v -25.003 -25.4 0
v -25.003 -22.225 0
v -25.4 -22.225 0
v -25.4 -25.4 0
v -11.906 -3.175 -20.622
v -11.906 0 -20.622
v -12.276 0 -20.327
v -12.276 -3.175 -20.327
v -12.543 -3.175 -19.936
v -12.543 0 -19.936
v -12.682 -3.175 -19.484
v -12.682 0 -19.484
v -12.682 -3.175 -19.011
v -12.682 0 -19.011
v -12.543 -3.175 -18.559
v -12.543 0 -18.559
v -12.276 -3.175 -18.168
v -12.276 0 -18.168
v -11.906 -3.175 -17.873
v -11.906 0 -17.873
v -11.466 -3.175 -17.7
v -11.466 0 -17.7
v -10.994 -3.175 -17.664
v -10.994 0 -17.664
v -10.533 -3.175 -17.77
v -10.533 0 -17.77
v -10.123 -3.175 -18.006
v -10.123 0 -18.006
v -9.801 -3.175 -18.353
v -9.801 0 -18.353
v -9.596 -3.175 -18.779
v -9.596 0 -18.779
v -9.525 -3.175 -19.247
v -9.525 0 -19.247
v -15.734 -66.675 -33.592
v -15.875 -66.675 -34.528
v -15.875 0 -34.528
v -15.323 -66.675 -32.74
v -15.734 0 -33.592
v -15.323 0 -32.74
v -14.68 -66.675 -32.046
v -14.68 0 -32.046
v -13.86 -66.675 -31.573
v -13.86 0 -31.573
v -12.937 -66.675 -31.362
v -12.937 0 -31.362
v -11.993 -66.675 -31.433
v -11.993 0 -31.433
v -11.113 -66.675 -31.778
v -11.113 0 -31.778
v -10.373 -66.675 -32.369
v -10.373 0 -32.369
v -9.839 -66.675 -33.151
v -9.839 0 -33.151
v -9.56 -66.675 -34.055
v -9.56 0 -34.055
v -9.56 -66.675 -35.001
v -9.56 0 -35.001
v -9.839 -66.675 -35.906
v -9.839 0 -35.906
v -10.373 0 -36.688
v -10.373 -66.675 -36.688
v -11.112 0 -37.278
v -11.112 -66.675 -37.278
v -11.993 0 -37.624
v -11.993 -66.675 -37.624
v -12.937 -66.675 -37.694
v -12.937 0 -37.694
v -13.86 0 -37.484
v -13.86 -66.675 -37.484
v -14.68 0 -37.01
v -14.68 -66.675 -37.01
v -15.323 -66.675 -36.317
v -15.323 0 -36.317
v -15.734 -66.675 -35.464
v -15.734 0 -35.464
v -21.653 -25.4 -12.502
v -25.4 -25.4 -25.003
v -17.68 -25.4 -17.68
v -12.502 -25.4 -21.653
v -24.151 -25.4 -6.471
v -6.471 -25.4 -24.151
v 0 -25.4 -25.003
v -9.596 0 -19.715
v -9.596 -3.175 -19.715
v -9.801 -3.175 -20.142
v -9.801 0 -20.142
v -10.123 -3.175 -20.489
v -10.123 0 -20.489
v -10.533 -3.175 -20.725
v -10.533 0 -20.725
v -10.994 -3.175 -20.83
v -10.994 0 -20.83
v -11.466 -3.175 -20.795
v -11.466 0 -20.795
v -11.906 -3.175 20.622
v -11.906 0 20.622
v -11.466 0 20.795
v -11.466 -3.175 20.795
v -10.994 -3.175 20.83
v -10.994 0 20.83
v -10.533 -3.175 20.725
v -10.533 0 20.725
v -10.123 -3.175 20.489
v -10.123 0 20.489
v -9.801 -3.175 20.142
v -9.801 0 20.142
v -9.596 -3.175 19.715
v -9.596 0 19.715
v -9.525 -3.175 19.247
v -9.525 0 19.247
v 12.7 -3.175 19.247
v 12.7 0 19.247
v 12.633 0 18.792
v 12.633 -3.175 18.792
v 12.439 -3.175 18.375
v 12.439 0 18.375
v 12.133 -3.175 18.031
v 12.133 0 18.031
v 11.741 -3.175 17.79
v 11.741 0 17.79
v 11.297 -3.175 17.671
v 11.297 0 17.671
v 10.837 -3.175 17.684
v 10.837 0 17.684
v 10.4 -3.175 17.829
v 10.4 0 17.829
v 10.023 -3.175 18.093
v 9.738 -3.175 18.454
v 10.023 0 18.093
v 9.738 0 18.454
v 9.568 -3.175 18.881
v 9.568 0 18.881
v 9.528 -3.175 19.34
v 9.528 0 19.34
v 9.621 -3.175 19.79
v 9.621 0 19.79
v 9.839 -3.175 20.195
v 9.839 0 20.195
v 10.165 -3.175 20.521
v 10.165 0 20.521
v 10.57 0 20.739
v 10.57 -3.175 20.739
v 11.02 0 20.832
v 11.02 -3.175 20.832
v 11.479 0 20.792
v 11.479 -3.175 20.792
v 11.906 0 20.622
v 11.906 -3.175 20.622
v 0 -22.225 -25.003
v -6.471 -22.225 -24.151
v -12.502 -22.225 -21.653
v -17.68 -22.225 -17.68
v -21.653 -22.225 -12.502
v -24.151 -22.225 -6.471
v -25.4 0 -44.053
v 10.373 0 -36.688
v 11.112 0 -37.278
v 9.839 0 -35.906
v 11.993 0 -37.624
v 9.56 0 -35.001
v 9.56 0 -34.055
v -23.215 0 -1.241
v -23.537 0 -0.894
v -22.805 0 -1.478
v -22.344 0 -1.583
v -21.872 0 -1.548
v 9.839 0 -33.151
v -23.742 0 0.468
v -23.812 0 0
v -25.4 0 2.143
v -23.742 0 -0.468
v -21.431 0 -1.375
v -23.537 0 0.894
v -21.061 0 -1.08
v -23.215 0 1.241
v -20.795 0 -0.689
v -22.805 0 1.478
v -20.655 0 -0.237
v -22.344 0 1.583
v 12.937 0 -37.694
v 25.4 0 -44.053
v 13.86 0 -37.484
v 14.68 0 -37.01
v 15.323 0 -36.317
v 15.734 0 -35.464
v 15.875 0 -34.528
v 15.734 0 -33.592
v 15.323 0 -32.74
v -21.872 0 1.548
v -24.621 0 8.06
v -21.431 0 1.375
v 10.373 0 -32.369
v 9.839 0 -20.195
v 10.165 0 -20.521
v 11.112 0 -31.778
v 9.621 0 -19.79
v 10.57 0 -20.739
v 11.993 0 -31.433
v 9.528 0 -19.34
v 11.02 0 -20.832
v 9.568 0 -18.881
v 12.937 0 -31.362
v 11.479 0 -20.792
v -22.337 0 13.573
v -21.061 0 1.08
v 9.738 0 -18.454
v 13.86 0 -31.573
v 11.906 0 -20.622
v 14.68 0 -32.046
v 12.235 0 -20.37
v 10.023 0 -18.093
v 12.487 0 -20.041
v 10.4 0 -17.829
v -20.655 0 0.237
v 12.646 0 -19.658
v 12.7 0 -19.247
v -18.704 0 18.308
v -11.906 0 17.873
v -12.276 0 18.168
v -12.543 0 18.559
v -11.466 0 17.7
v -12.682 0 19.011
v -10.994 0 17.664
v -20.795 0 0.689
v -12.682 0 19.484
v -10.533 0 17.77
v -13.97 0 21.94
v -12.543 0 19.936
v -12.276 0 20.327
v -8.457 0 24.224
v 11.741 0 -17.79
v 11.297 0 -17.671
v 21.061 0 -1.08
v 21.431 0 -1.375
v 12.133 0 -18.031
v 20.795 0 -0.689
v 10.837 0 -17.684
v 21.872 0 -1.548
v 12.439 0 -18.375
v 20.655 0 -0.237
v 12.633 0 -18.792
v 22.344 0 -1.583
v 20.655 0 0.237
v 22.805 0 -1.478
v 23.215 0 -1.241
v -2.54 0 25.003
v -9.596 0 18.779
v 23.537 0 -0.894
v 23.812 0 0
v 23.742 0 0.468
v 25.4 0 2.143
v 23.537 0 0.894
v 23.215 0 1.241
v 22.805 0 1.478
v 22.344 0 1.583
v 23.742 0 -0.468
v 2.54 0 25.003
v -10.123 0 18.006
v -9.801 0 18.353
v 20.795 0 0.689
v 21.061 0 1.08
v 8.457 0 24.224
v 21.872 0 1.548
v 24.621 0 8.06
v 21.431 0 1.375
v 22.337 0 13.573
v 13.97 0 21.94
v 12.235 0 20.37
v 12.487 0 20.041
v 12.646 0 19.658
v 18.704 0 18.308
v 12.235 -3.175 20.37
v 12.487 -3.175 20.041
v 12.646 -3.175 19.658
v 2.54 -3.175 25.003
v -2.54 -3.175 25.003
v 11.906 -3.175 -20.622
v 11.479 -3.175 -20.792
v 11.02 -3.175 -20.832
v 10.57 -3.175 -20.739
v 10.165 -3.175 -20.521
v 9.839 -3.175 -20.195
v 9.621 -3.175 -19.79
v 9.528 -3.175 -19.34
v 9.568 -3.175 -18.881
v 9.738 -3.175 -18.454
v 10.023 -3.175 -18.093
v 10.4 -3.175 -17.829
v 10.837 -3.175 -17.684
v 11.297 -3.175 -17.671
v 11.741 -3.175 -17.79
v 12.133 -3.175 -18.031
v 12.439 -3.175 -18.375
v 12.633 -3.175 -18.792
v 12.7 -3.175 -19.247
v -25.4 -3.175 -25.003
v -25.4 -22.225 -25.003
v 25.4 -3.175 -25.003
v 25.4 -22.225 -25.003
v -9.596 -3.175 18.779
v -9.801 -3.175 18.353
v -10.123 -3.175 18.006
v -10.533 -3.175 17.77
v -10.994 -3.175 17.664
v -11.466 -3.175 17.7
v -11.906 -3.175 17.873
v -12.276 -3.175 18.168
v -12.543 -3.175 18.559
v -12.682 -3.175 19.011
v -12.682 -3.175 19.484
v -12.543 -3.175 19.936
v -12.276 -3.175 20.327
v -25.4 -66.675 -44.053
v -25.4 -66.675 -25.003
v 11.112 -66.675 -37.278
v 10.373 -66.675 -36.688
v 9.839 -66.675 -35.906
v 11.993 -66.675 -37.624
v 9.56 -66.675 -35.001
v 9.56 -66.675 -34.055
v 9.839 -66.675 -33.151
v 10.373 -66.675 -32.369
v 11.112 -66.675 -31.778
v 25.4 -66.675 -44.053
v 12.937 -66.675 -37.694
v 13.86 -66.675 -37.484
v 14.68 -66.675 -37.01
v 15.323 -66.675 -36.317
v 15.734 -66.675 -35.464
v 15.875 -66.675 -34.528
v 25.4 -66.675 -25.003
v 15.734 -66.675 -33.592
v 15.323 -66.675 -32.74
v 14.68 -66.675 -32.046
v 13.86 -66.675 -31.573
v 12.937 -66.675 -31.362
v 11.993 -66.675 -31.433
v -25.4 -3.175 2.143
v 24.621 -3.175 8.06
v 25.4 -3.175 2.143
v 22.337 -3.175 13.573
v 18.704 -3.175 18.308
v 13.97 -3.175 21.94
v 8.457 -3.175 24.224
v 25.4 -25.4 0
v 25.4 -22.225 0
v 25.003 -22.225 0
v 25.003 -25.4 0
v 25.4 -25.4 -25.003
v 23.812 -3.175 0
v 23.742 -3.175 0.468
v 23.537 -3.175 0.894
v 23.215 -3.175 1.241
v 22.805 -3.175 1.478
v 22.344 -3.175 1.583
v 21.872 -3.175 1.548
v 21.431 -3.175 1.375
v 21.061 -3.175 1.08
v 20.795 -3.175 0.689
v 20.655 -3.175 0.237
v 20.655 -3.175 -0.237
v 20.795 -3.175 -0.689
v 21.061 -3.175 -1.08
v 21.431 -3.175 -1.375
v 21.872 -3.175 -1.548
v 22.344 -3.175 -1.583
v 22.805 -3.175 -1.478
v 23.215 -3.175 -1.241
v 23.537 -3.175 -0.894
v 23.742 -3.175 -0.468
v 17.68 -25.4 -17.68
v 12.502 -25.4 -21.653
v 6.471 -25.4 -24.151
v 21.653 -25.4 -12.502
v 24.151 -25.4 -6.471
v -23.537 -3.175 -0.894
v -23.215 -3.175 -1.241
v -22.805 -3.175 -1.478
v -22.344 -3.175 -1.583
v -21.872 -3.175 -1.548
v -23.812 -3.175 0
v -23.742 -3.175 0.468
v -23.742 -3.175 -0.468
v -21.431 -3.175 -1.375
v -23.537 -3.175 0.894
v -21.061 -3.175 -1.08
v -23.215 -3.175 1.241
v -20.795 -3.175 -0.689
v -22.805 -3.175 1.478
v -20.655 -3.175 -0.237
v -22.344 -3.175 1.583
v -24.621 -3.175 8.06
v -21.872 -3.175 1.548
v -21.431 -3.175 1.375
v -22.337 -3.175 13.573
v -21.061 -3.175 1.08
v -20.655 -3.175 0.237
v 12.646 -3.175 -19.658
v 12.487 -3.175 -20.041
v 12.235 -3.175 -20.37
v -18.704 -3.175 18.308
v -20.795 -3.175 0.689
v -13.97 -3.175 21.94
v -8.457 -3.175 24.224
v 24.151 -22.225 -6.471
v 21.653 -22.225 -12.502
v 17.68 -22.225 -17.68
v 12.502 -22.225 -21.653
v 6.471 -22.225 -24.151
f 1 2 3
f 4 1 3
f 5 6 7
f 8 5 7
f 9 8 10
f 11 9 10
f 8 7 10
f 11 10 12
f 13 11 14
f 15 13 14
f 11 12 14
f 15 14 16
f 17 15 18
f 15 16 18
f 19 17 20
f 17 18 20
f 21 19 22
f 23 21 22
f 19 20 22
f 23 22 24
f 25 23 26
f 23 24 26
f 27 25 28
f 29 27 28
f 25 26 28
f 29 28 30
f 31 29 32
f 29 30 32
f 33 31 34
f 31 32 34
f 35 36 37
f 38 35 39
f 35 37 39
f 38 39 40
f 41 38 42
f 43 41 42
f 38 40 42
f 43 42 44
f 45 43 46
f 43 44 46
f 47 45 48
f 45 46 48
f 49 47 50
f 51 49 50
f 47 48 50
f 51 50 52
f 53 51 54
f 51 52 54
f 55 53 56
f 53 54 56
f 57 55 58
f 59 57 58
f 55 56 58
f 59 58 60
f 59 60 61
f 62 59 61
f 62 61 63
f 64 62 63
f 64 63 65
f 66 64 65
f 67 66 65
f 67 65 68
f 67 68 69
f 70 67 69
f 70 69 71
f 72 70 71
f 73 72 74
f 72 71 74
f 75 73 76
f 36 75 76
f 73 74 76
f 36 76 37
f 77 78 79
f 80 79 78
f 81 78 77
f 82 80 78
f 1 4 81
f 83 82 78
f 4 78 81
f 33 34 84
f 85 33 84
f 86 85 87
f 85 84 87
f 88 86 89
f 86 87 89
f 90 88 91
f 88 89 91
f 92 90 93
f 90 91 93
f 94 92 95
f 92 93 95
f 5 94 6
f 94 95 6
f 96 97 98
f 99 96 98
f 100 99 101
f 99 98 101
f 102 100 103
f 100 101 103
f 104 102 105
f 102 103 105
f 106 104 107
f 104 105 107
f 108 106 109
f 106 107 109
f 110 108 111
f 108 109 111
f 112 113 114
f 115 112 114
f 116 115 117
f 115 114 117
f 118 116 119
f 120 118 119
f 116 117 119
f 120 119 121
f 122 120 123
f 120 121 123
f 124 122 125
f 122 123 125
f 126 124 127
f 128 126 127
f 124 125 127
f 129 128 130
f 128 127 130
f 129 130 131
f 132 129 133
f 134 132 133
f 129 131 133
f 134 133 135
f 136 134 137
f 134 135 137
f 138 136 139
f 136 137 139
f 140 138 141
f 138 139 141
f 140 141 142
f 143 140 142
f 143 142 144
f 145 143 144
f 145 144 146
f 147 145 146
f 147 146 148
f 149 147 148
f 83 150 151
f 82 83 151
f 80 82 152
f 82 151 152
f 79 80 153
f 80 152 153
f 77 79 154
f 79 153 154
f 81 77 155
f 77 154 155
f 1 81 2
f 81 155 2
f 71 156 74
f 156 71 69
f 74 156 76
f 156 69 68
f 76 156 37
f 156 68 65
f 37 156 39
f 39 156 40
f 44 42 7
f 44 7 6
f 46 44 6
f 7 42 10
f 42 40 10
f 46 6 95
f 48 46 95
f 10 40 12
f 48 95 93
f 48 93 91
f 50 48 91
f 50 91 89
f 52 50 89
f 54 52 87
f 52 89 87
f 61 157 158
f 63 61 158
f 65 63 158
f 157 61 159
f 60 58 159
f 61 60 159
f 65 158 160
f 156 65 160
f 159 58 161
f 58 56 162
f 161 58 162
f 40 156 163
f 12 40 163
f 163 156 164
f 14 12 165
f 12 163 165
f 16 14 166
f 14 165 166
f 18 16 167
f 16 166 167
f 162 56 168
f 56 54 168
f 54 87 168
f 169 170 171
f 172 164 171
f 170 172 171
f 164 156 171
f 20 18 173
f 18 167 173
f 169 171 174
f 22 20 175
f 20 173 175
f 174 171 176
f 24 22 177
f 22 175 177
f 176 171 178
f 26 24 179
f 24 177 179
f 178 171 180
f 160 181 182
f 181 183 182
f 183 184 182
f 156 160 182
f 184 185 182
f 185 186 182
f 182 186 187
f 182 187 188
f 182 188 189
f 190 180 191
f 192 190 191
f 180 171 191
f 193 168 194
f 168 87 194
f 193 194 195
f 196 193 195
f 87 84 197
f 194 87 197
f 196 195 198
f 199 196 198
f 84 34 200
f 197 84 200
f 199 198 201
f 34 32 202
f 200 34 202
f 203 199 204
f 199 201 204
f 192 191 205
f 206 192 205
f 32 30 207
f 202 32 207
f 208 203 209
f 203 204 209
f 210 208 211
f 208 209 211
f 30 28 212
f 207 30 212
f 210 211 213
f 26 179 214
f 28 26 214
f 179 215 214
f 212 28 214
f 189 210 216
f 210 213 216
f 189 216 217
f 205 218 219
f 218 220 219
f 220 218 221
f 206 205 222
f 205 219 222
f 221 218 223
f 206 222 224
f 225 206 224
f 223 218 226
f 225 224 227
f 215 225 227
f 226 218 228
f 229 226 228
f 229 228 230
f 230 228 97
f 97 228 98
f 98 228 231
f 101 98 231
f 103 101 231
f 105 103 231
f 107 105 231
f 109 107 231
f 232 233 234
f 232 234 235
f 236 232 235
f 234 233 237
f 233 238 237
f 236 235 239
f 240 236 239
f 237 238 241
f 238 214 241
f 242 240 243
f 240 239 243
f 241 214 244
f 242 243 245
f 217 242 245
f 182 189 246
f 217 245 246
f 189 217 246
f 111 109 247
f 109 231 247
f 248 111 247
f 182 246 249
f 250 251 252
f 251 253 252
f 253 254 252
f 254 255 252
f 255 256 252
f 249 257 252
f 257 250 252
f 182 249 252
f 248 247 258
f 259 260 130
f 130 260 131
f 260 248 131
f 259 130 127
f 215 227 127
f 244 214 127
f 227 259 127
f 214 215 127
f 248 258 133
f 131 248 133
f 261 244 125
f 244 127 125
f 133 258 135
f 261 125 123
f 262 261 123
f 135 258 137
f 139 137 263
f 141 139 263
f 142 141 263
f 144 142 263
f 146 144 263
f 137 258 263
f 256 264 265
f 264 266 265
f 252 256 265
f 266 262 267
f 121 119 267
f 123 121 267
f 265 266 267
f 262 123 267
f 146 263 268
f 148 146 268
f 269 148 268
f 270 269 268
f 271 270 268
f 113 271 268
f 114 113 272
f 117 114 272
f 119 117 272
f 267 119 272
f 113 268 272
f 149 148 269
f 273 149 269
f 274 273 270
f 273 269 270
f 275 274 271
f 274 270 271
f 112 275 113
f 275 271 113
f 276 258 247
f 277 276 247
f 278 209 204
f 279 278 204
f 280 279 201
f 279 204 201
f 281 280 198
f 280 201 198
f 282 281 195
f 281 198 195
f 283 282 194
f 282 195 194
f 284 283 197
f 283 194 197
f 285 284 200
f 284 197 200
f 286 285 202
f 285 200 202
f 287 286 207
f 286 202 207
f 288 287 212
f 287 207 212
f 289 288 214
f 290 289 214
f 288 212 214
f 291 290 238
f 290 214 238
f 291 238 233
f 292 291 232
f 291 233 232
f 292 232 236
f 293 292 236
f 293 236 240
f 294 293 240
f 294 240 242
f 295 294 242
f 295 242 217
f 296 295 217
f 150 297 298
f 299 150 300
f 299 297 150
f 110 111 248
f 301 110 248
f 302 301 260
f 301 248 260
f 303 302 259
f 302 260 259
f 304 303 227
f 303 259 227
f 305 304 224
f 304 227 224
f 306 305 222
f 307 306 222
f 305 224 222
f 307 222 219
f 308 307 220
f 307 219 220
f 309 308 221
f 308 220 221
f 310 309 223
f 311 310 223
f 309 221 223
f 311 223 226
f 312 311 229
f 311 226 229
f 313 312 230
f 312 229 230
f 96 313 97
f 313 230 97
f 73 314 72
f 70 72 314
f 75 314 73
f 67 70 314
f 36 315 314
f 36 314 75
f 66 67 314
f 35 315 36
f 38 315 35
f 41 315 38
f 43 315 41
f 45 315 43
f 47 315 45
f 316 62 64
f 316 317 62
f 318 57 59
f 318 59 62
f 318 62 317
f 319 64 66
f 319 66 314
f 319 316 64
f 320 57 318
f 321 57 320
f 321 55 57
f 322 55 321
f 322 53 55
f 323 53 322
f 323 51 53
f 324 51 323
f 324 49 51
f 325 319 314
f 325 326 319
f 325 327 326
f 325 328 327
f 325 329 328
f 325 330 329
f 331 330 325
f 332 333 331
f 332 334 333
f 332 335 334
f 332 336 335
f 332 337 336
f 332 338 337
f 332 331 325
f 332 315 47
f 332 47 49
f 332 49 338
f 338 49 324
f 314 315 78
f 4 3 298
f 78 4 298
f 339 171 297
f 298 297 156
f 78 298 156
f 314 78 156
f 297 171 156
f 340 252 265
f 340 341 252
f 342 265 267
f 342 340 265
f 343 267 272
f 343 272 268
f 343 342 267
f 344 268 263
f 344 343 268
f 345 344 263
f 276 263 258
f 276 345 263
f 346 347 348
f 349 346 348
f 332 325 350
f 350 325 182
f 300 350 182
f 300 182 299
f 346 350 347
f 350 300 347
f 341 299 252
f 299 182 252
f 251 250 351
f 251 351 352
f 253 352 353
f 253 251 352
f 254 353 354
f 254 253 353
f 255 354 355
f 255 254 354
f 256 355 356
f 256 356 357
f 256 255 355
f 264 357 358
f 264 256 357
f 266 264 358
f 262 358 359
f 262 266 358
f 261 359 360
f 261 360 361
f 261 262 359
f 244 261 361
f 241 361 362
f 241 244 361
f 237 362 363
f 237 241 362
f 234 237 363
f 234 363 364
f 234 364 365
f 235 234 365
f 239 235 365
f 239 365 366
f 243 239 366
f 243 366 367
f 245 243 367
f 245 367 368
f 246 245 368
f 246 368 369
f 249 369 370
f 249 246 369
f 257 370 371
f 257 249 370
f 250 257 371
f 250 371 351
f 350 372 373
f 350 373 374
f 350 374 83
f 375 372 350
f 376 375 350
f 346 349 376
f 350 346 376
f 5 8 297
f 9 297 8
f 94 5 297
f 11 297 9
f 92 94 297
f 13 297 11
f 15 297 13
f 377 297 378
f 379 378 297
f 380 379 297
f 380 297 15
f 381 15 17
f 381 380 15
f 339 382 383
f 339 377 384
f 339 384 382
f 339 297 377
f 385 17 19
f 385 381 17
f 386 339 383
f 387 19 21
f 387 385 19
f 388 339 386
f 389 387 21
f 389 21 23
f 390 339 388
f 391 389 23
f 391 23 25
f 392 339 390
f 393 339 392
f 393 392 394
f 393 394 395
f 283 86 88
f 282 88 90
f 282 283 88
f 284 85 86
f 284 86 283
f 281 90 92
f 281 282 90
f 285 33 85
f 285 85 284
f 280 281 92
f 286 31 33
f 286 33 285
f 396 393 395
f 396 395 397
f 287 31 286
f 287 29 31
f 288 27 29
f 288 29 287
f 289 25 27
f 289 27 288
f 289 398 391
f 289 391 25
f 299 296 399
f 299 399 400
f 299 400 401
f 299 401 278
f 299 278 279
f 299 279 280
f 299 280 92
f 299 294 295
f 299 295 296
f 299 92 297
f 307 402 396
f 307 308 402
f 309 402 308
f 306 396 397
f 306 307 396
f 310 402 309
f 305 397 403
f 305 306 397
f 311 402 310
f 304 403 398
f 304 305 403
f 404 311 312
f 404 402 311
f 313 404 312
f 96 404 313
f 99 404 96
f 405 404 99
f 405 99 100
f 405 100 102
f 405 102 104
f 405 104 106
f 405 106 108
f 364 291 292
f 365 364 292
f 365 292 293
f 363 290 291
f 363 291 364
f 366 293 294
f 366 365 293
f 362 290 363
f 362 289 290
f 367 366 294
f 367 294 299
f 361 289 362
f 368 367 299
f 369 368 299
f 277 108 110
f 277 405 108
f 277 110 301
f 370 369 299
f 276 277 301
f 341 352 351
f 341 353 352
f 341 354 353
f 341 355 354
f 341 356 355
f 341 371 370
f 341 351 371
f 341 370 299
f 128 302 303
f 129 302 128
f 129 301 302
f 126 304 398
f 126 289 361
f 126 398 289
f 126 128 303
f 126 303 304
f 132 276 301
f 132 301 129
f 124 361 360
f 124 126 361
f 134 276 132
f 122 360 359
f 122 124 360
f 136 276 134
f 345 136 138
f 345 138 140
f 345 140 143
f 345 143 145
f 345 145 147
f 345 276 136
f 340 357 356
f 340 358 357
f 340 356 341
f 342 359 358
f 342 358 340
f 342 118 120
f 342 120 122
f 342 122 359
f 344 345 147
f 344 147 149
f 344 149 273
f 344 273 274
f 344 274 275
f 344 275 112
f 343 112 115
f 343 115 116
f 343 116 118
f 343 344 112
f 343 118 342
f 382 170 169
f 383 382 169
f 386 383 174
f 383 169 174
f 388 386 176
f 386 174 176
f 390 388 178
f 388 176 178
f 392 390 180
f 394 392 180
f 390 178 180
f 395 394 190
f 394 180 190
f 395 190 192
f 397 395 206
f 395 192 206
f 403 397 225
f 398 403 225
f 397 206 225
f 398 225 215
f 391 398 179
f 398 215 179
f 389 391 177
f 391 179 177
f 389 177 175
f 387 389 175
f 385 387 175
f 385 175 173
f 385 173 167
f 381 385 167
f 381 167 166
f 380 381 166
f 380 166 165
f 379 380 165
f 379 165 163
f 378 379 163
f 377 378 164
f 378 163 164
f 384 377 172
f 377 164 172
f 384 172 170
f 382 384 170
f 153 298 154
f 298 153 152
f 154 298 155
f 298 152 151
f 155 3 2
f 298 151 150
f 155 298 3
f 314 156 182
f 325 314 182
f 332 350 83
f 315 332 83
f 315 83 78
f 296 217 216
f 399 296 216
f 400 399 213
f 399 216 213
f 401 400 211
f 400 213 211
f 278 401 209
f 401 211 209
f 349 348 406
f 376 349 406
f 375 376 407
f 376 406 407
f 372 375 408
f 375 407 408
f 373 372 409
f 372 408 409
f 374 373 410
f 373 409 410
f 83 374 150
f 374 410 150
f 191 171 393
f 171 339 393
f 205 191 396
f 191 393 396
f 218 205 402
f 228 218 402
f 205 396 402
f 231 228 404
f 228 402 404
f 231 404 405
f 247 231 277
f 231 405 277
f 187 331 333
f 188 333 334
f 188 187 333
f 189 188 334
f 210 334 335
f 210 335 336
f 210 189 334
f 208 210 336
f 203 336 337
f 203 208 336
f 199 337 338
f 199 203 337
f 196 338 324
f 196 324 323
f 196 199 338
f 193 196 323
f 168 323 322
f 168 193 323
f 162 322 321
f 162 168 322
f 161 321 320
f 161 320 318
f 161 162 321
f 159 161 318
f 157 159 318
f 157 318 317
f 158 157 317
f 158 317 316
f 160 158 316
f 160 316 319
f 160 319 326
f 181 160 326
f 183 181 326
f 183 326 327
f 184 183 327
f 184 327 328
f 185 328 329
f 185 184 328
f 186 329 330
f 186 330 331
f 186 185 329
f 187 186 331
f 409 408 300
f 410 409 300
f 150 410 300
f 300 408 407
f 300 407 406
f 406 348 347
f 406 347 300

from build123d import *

# Parameters (mm, degrees)
F0_R     = 3.175
F1_DEPTH = 66.675
F2_DEPTH = 25.4
F3_DEPTH = 22.225
F0_R_2   = 1.5875
F4_DEPTH = 3.175
F5_R     = 22.86


with BuildPart() as f1:
    # F0 (on Front) → F1 (new body)
    with BuildSketch(Plane.XZ):
        Polygon((25.4, -25.003125), (0, -25.003125), (-25.4, -25.003125), (-25.4, -34.528125), (-25.4, -44.053125), (25.4, -44.053125), align=None)
        with BuildLine():
            ThreePointArc((-9.525, -34.528125), (-12.7, -37.703125), (-15.875, -34.528125))
            ThreePointArc((-15.875, -34.528125), (-12.7, -31.353125), (-9.525, -34.528125))
        make_face(mode=Mode.SUBTRACT)
        with Locations((12.7, -34.528125)):
            Circle(F0_R, mode=Mode.SUBTRACT)
    extrude(amount=F1_DEPTH)

    # F0 (on Front) → F2 (join)
    with BuildSketch(Plane.XZ):
        with BuildLine():
            Line((-25.4, -25.003125), (0, -25.003125))
            ThreePointArc((0, -25.003125), (-17.6798792384, -17.6798792384), (-25.003125, 0))
            Line((-25.003125, 0), (-25.4, 0))
            Line((-25.4, 0), (-25.4, -25.003125))
        make_face()
        with BuildLine():
            Line((25.4, 0), (25.003125, 0))
            ThreePointArc((25.003125, 0), (17.6798792384, -17.6798792384), (0, -25.003125))
            Line((0, -25.003125), (25.4, -25.003125))
            Line((25.4, -25.003125), (25.4, 0))
        make_face()
    extrude(amount=F2_DEPTH)

    # F0 (on Front) → F3 (cut)
    with BuildSketch(Plane.XZ):
        with BuildLine():
            Line((-25.4, -25.003125), (0, -25.003125))
            ThreePointArc((0, -25.003125), (-17.6798792384, -17.6798792384), (-25.003125, 0))
            Line((-25.003125, 0), (-25.4, 0))
            Line((-25.4, 0), (-25.4, -25.003125))
        make_face()
        with BuildLine():
            Line((25.4, 0), (25.003125, 0))
            ThreePointArc((25.003125, 0), (17.6798792384, -17.6798792384), (0, -25.003125))
            Line((0, -25.003125), (25.4, -25.003125))
            Line((25.4, -25.003125), (25.4, 0))
        make_face()
    extrude(amount=F3_DEPTH, mode=Mode.SUBTRACT)

    # F0 (on Front) → F4 (join)
    with BuildSketch(Plane.XZ):
        with BuildLine():
            ThreePointArc((11.906250128, -20.6222298537), (20.6222299646, -11.906249936), (23.8125, 0))
            ThreePointArc((23.8125, 0), (20.6222299411, 11.9062499767), (11.9062500466, 20.6222299007))
            ThreePointArc((11.9062500466, 20.6222299007), (3.75e-08, 23.8125), (-11.9062499816, 20.6222299383))
            ThreePointArc((-11.9062499816, 20.6222299383), (-20.6222299223, 11.9062500092), (-23.8125, 0))
            ThreePointArc((-23.8125, 0), (-20.622229928, -11.9062499993), (-11.9062500014, -20.6222299268))
            ThreePointArc((-11.9062500014, -20.6222299268), (7.31e-08, -23.8125), (11.906250128, -20.6222298537))
        make_face()
        with BuildLine():
            ThreePointArc((-9.525, -19.2474145991), (-10.3187500007, -20.622229928), (-11.9062500014, -20.6222299268))
            ThreePointArc((-11.9062500014, -20.6222299268), (-11.9062499993, -17.8725992702), (-9.525, -19.2474145991))
        make_face(mode=Mode.SUBTRACT)
        with BuildLine():
            ThreePointArc((12.7, -19.2474145991), (12.4873153655, -20.0411645351), (11.906250128, -20.6222298537))
            ThreePointArc((11.906250128, -20.6222298537), (9.7376846345, -18.4536646631), (12.7, -19.2474145991))
        make_face(mode=Mode.SUBTRACT)
        with BuildLine():
            ThreePointArc((-20.6375, 0), (-22.225, -1.5875), (-23.8125, 0))
            ThreePointArc((-23.8125, 0), (-22.225, 1.5875), (-20.6375, 0))
        make_face(mode=Mode.SUBTRACT)
        with BuildLine():
            ThreePointArc((-9.525, 19.2474145991), (-11.9062500092, 17.8725992759), (-11.9062499816, 20.6222299383))
            ThreePointArc((-11.9062499816, 20.6222299383), (-10.3187499908, 20.6222299223), (-9.525, 19.2474145991))
        make_face(mode=Mode.SUBTRACT)
        with Locations((22.225, 0)):
            Circle(F0_R_2, mode=Mode.SUBTRACT)
        with BuildLine():
            ThreePointArc((12.7, 19.2474145991), (9.737684658, 18.4536646224), (11.9062500466, 20.6222299007))
            ThreePointArc((11.9062500466, 20.6222299007), (12.487315342, 20.0411645758), (12.7, 19.2474145991))
        make_face(mode=Mode.SUBTRACT)
        with BuildLine():
            Line((23.8125, 0), (25.003125, 0))
            ThreePointArc((25.003125, 0), (17.6798792384, 17.6798792384), (0, 25.003125))
            ThreePointArc((0, 25.003125), (-17.6798792384, 17.6798792384), (-25.003125, 0))
            Line((-25.003125, 0), (-23.8125, 0))
            ThreePointArc((-23.8125, 0), (-20.6222299223, 11.9062500092), (-11.9062499816, 20.6222299383))
            ThreePointArc((-11.9062499816, 20.6222299383), (3.75e-08, 23.8125), (11.9062500466, 20.6222299007))
            ThreePointArc((11.9062500466, 20.6222299007), (20.6222299411, 11.9062499767), (23.8125, 0))
        make_face()
        with BuildLine():
            Line((25.4, 0), (25.003125, 0))
            ThreePointArc((25.003125, 0), (17.6798792384, -17.6798792384), (0, -25.003125))
            Line((0, -25.003125), (25.4, -25.003125))
            Line((25.4, -25.003125), (25.4, 0))
        make_face()
        with BuildLine():
            Line((-25.4, -25.003125), (0, -25.003125))
            ThreePointArc((0, -25.003125), (-17.6798792384, -17.6798792384), (-25.003125, 0))
            Line((-25.003125, 0), (-25.4, 0))
            Line((-25.4, 0), (-25.4, -25.003125))
        make_face()
        with BuildLine():
            ThreePointArc((0, 25.003125), (17.6798792384, 17.6798792384), (25.003125, 0))
            Line((25.003125, 0), (25.4, 0))
            Line((25.4, 0), (25.4, 25.003125))
            Line((25.4, 25.003125), (0, 25.003125))
        make_face()
        with BuildLine():
            ThreePointArc((-25.003125, 0), (-17.6798792384, 17.6798792384), (0, 25.003125))
            Line((0, 25.003125), (-25.4, 25.003125))
            Line((-25.4, 25.003125), (-25.4, 0))
            Line((-25.4, 0), (-25.003125, 0))
        make_face()
        with BuildLine():
            ThreePointArc((0, -25.003125), (17.6798792384, -17.6798792384), (25.003125, 0))
            Line((25.003125, 0), (23.8125, 0))
            ThreePointArc((23.8125, 0), (20.6222299646, -11.906249936), (11.906250128, -20.6222298537))
            ThreePointArc((11.906250128, -20.6222298537), (7.31e-08, -23.8125), (-11.9062500014, -20.6222299268))
            ThreePointArc((-11.9062500014, -20.6222299268), (-20.622229928, -11.9062499993), (-23.8125, 0))
            Line((-23.8125, 0), (-25.003125, 0))
            ThreePointArc((-25.003125, 0), (-17.6798792384, -17.6798792384), (0, -25.003125))
        make_face()
    extrude(amount=F4_DEPTH)

    # F5
    f5_edges = [f1.edges().sort_by_distance(p)[0] for p in [
        (25.4, -1.5875, 25.003125),
        (-25.4, -1.5875, 25.003125),
    ]]
    fillet(f5_edges, radius=F5_R)


solid = f1.part
